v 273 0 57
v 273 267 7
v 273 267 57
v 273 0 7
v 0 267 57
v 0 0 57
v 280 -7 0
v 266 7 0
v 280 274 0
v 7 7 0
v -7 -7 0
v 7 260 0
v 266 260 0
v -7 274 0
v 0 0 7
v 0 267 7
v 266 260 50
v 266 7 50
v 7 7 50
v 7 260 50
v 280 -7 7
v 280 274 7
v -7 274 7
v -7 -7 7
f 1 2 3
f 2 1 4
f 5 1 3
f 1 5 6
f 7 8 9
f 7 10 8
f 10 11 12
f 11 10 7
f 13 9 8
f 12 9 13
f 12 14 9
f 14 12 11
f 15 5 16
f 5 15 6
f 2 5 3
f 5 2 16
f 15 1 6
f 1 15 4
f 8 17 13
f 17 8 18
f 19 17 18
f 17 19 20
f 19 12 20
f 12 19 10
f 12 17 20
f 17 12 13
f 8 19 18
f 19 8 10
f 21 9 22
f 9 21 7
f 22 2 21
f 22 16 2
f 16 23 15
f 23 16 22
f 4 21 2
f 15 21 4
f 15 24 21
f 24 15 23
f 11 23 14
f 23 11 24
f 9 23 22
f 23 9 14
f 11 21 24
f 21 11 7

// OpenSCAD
// Parametric Midea Dual Air Hose adapter
THICKNESS = 7;

// All these values are completly arbitrary for now
PLASTIC_RIM_FILTER = 7;
TOTAL_WIDTH_FILTER = 273;
TOTAL_HEIGHT_FILTER = 246;

WIDTH_FILTER = TOTAL_WIDTH_FILTER - 2 * PLASTIC_RIM_FILTER;
HEIGHT_FILTER = TOTAL_HEIGHT_FILTER - 2 * PLASTIC_RIM_FILTER;

WIDTH_SEAL = 10;
// Extra tolerance for gluing
SEAL_EXTRA_TOLERANCE = 4;
WIDTH_SEAL_LIP = WIDTH_SEAL + SEAL_EXTRA_TOLERANCE;
SEAL_PROTRUSION_FROM_BOX = max(WIDTH_SEAL_LIP - THICKNESS, 0);
THICKNESS_SEAL_LIP = min(THICKNESS, 10);

DEPTH_EXPANSION_BOX = 50;

// various constants for the hose adapter. No idea how to do that yet...

MAGNET_DIAMETER = 3;
MAGNET_DISTANCE_TO_MESH = 3;

// Quirks of this specific AC
// Rim between filter and hot air outlet
RIM_ABOVE = 3;
RIM_ABOVE_TOLERANCE = 1;
// Rim to dodge thethe plastic portruding from the middle of the bottom of the filter
RIM_BELOW = PLASTIC_RIM_FILTER;
RIM_HEIGHT_PORTRUSION = 8;

module box() {
  inner_width_box = WIDTH_FILTER;
  inner_depth_box = DEPTH_EXPANSION_BOX;

  // Inner height so that the extrusion on the bottom of the filter is also contained. Logic:
  // If box covers plastic rim of filter:
  assert((THICKNESS + SEAL_PROTRUSION_FROM_BOX) > PLASTIC_RIM_FILTER);
  // Then inner height should be: (Width of box + seal (which is definitely larger than the width of the filters plastic rim)) + height of the filter(without the plastic rims) + 1 x Plastic rim to extend it so it covers the bottom protrusion.
  inner_height_box = (THICKNESS + SEAL_PROTRUSION_FROM_BOX) + HEIGHT_FILTER + RIM_BELOW;
  echo("Inner height of box=", inner_height_box);

  outer_width_box = inner_width_box + 2 * THICKNESS;
  outer_depth_box = inner_depth_box + THICKNESS;

  outer_height_box = inner_height_box + 2 * THICKNESS;

  // Main body
  difference() {
    cube([outer_width_box, outer_height_box, outer_depth_box]);
    translate([THICKNESS, THICKNESS, 0]) {
      cube([inner_width_box, inner_height_box, inner_depth_box]);
    }
  }
  
  // Sealant lip
  // If mostly for clarity
  if (SEAL_PROTRUSION_FROM_BOX > 0) {
    translate([-SEAL_PROTRUSION_FROM_BOX, -SEAL_PROTRUSION_FROM_BOX, 0]) {
      difference() {
        cube([outer_width_box + 2 * SEAL_PROTRUSION_FROM_BOX, outer_height_box + 2 * SEAL_PROTRUSION_FROM_BOX, THICKNESS_SEAL_LIP]);
        translate([SEAL_PROTRUSION_FROM_BOX, SEAL_PROTRUSION_FROM_BOX, 0]) {
          cube([outer_width_box, outer_height_box, THICKNESS_SEAL_LIP]);
        }
      }
    }
  }
}

box();
